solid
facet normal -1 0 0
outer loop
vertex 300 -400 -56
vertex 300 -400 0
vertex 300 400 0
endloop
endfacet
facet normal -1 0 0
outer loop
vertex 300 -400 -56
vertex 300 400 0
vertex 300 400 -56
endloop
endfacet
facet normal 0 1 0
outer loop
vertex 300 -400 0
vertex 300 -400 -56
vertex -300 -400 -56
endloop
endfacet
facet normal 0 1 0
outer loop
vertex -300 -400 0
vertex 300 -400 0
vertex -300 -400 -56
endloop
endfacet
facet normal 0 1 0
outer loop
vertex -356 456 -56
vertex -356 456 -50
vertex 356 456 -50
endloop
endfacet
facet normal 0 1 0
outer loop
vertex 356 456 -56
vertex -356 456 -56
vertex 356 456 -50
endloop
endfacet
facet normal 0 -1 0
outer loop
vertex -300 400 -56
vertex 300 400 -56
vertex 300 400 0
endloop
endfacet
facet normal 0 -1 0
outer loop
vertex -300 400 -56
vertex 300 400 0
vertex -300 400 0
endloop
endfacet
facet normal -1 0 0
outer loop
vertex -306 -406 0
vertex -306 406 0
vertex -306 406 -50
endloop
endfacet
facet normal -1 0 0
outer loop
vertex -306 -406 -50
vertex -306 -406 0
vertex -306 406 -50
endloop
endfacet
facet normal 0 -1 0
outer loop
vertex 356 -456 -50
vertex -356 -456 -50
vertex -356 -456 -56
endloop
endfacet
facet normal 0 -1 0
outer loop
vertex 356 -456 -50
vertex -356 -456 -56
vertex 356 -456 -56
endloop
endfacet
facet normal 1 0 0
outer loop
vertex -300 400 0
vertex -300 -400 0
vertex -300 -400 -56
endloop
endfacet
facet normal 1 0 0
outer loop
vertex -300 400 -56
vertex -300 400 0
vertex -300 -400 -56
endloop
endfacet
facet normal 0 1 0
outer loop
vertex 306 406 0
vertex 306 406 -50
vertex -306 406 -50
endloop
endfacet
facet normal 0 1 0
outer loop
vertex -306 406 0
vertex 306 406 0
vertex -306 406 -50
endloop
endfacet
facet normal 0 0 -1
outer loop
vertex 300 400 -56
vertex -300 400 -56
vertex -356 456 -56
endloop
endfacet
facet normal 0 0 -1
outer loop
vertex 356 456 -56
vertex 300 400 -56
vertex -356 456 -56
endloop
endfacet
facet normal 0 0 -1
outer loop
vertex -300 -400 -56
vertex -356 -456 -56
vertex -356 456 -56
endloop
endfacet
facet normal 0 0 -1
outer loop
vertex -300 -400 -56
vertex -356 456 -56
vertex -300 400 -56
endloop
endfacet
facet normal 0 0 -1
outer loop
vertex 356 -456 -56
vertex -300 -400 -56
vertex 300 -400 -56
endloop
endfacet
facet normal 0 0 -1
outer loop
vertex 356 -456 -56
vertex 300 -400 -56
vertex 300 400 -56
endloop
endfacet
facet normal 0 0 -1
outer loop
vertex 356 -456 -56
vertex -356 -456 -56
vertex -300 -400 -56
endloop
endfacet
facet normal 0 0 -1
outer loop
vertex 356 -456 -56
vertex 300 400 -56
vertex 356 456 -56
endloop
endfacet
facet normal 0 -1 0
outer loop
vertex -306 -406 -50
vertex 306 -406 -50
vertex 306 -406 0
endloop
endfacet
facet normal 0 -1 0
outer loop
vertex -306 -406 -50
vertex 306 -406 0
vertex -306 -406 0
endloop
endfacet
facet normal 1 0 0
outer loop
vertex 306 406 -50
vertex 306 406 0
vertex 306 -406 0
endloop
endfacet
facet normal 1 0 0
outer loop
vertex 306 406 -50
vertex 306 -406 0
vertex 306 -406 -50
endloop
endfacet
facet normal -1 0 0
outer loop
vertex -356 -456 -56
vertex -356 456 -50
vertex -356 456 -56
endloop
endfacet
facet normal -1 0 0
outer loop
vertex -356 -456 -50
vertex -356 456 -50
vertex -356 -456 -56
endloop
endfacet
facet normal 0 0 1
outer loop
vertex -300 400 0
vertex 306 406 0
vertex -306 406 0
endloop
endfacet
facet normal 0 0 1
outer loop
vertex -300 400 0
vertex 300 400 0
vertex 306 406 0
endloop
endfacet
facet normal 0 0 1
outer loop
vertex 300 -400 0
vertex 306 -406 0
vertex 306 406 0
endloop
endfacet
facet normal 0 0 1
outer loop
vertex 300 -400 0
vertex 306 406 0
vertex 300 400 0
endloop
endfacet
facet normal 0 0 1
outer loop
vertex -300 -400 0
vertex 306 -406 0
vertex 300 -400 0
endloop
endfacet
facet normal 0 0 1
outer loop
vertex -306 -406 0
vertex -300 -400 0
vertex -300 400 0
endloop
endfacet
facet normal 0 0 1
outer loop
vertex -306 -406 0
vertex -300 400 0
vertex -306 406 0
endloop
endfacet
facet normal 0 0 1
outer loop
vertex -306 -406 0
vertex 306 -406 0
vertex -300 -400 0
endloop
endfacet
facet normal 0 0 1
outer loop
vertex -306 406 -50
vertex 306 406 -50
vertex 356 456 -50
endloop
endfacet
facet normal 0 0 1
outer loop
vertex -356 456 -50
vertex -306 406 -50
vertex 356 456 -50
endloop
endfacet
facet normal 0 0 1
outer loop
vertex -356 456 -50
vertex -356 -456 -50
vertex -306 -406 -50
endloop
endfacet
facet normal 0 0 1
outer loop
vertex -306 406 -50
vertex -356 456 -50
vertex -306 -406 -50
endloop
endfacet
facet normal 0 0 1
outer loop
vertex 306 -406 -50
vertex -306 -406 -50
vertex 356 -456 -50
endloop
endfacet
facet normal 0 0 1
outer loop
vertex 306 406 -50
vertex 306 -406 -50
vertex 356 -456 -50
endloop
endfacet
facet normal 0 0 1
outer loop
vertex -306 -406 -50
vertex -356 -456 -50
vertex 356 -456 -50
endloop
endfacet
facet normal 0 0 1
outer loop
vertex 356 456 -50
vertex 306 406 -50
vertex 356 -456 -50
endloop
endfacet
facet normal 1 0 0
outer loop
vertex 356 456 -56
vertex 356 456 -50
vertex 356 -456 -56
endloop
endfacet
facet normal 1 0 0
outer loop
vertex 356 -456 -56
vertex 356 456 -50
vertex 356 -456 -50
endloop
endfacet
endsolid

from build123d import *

# Parameters (mm, degrees)
SKETCH052_W            = 600
SKETCH052_H            = 60
PAD003_DEPTH           = 400
SKETCH004_W            = 612
SKETCH004_H            = 50
PAD004_DEPTH           = 406
SKETCH053_W            = 712
SKETCH053_H            = 912
PAD005_DEPTH           = 6
CUT001_PLACEMENT_ANGLE = 180


with BuildPart() as body002:
    # Sketch052 → Pad003 (new body, symmetric)
    with BuildSketch(Plane.XZ):
        with Locations((0, 30)):
            Rectangle(SKETCH052_W, SKETCH052_H)
    extrude(amount=PAD003_DEPTH, both=True)


with BuildPart() as cut001:
    # Sketch004 → Pad004 (new body, symmetric)
    with BuildSketch(Plane.XZ):
        with Locations((0, 25)):
            Rectangle(SKETCH004_W, SKETCH004_H)
    extrude(amount=PAD004_DEPTH, both=True)

    # Sketch053 (on Face3 of Pad004) → Pad005 (join)
    with BuildSketch(Plane(origin=(0, 0, 50), x_dir=(-1, 0, 0), z_dir=(0, 0, 1))):
        Rectangle(SKETCH053_W, SKETCH053_H)
    extrude(amount=PAD005_DEPTH)

    # Cut001: cut Body002
    add(body002.part, mode=Mode.SUBTRACT)


with BuildPart() as cut001_1:
    # Cut001 placement: moved
    add(cut001.part.rotate(Axis((0, 0, 0), (0, 1, 0)), CUT001_PLACEMENT_ANGLE))


solid = cut001_1.part
